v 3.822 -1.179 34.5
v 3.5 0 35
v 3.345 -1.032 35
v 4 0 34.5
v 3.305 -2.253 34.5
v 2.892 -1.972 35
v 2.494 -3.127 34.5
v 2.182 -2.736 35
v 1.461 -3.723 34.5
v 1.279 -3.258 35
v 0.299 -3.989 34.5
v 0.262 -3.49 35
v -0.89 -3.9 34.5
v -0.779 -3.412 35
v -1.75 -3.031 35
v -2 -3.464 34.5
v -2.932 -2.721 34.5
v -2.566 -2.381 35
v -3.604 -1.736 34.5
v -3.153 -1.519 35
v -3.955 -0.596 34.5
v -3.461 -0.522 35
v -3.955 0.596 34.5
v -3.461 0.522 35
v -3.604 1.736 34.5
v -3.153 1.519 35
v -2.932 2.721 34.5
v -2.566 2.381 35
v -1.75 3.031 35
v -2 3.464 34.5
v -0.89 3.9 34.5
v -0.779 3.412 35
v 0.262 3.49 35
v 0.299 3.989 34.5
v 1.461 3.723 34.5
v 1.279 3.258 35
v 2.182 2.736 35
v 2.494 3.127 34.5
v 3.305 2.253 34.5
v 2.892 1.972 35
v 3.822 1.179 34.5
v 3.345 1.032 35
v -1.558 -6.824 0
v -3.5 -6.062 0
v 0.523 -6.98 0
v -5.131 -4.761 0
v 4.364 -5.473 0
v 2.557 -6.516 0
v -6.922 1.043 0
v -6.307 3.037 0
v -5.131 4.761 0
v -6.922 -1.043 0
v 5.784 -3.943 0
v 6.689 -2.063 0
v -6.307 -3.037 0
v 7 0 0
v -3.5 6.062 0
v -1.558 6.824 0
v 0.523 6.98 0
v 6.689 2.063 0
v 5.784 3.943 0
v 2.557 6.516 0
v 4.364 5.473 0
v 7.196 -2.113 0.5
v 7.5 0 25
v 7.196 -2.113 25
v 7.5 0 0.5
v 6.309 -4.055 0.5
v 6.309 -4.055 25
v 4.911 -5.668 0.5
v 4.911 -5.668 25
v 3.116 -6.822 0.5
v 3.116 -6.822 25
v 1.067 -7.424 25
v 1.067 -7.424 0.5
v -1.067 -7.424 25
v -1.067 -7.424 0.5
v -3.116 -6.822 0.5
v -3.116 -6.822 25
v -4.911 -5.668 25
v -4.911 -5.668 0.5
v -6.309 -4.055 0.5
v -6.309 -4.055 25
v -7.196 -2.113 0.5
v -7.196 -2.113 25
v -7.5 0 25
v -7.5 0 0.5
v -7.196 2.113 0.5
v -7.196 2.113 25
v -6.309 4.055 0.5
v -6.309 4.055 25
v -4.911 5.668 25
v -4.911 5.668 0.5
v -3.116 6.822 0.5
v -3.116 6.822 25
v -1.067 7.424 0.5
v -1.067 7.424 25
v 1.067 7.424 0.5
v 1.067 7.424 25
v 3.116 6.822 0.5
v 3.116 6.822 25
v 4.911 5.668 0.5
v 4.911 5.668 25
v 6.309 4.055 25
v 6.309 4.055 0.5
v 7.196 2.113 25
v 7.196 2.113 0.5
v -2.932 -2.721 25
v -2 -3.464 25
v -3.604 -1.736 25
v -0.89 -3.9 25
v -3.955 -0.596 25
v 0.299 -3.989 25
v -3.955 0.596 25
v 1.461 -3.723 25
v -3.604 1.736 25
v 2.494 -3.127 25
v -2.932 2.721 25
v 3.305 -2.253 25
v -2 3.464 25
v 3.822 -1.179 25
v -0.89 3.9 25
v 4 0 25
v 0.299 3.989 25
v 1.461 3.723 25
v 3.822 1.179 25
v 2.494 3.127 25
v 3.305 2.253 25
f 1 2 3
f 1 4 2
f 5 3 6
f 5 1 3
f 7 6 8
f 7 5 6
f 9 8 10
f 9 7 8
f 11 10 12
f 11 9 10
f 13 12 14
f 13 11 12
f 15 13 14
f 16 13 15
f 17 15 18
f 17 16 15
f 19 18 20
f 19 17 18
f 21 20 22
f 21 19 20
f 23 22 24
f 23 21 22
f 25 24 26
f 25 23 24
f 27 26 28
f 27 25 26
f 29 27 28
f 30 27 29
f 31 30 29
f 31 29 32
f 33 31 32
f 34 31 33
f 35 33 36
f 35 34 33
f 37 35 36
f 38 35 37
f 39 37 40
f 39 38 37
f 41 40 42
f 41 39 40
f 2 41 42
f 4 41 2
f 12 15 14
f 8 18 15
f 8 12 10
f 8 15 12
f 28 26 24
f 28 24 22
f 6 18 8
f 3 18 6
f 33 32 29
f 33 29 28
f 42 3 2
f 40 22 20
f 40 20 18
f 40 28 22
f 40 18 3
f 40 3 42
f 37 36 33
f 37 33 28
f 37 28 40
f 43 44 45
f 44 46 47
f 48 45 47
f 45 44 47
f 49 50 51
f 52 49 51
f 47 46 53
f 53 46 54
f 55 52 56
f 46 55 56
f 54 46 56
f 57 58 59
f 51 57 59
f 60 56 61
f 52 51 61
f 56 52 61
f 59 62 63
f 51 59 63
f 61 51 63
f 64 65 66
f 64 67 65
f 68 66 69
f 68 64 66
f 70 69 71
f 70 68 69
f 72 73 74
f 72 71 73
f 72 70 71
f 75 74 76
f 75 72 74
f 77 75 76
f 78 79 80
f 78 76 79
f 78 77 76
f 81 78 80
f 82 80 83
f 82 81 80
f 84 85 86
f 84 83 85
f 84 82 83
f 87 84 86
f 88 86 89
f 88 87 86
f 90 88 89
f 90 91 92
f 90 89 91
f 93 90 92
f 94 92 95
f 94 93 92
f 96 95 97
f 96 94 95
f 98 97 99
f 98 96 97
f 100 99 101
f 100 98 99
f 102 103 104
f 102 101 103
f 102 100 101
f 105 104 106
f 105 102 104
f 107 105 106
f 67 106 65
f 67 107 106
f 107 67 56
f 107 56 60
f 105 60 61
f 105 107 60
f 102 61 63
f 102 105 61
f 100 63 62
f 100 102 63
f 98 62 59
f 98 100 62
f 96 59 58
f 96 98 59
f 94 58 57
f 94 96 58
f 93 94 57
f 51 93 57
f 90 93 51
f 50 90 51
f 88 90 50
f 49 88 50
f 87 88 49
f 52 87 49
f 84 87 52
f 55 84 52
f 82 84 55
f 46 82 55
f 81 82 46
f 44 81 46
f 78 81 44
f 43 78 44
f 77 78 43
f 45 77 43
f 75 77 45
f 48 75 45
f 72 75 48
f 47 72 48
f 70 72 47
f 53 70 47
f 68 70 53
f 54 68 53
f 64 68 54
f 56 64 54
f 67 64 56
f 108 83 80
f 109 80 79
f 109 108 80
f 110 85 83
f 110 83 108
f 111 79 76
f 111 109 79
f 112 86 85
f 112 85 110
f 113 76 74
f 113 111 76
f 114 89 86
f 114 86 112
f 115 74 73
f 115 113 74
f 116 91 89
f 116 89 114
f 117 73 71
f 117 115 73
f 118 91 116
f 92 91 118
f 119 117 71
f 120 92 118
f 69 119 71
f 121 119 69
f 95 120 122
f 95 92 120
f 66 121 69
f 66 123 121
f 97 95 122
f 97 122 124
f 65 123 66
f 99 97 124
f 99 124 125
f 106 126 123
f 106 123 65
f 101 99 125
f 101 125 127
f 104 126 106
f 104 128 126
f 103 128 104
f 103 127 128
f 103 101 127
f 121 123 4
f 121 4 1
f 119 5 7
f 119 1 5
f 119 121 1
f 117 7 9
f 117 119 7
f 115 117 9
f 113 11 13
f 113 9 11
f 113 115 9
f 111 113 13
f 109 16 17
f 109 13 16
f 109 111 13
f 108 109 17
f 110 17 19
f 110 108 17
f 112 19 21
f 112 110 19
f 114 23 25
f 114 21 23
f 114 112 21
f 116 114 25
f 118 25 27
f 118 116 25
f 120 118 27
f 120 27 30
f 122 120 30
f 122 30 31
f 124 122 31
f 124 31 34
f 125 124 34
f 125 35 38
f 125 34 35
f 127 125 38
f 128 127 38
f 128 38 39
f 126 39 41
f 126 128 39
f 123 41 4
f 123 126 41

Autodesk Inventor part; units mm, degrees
ref_plane "YZ Plane" through (0, 0, 0) normal (1, 0, 0) x (0, 1, 0)
ref_plane "XZ Plane" through (0, 0, 0) normal (0, 1, 0) x (-1, 0, 0)
ref_plane "XY Plane" through (0, 0, 0) normal (0, 0, 1) x (1, 0, 0)
sketch "Schizzo1" plane through (0, 0, 0) normal (0, 0, 1) x (1, 0, 0)
  circle A0 centre (0, 0) radius 7.5
  dimension "d0" = 15
extrude "Estrusione1" add sketch "Schizzo1" along normal blind 25
sketch "Schizzo2" plane through (0, 0, 25) normal (0, 0, 1) x (1, 0, 0)
  circle A0 centre (0, 0) radius 4
  dimension "d3" = 8
extrude "Estrusione2" add sketch "Schizzo2" along normal blind 10
chamfer "Smusso1" distance 0.5 angle 45 2 edges at (-4, 0, 35) (-7.5, 0, 0)
thread "Filettatura2" size "M10x1.5" class "6g" standard "ANSI Metric M Profile" full length
properties part number "Perno tendi motore" material "Acciaio inossidabile"
